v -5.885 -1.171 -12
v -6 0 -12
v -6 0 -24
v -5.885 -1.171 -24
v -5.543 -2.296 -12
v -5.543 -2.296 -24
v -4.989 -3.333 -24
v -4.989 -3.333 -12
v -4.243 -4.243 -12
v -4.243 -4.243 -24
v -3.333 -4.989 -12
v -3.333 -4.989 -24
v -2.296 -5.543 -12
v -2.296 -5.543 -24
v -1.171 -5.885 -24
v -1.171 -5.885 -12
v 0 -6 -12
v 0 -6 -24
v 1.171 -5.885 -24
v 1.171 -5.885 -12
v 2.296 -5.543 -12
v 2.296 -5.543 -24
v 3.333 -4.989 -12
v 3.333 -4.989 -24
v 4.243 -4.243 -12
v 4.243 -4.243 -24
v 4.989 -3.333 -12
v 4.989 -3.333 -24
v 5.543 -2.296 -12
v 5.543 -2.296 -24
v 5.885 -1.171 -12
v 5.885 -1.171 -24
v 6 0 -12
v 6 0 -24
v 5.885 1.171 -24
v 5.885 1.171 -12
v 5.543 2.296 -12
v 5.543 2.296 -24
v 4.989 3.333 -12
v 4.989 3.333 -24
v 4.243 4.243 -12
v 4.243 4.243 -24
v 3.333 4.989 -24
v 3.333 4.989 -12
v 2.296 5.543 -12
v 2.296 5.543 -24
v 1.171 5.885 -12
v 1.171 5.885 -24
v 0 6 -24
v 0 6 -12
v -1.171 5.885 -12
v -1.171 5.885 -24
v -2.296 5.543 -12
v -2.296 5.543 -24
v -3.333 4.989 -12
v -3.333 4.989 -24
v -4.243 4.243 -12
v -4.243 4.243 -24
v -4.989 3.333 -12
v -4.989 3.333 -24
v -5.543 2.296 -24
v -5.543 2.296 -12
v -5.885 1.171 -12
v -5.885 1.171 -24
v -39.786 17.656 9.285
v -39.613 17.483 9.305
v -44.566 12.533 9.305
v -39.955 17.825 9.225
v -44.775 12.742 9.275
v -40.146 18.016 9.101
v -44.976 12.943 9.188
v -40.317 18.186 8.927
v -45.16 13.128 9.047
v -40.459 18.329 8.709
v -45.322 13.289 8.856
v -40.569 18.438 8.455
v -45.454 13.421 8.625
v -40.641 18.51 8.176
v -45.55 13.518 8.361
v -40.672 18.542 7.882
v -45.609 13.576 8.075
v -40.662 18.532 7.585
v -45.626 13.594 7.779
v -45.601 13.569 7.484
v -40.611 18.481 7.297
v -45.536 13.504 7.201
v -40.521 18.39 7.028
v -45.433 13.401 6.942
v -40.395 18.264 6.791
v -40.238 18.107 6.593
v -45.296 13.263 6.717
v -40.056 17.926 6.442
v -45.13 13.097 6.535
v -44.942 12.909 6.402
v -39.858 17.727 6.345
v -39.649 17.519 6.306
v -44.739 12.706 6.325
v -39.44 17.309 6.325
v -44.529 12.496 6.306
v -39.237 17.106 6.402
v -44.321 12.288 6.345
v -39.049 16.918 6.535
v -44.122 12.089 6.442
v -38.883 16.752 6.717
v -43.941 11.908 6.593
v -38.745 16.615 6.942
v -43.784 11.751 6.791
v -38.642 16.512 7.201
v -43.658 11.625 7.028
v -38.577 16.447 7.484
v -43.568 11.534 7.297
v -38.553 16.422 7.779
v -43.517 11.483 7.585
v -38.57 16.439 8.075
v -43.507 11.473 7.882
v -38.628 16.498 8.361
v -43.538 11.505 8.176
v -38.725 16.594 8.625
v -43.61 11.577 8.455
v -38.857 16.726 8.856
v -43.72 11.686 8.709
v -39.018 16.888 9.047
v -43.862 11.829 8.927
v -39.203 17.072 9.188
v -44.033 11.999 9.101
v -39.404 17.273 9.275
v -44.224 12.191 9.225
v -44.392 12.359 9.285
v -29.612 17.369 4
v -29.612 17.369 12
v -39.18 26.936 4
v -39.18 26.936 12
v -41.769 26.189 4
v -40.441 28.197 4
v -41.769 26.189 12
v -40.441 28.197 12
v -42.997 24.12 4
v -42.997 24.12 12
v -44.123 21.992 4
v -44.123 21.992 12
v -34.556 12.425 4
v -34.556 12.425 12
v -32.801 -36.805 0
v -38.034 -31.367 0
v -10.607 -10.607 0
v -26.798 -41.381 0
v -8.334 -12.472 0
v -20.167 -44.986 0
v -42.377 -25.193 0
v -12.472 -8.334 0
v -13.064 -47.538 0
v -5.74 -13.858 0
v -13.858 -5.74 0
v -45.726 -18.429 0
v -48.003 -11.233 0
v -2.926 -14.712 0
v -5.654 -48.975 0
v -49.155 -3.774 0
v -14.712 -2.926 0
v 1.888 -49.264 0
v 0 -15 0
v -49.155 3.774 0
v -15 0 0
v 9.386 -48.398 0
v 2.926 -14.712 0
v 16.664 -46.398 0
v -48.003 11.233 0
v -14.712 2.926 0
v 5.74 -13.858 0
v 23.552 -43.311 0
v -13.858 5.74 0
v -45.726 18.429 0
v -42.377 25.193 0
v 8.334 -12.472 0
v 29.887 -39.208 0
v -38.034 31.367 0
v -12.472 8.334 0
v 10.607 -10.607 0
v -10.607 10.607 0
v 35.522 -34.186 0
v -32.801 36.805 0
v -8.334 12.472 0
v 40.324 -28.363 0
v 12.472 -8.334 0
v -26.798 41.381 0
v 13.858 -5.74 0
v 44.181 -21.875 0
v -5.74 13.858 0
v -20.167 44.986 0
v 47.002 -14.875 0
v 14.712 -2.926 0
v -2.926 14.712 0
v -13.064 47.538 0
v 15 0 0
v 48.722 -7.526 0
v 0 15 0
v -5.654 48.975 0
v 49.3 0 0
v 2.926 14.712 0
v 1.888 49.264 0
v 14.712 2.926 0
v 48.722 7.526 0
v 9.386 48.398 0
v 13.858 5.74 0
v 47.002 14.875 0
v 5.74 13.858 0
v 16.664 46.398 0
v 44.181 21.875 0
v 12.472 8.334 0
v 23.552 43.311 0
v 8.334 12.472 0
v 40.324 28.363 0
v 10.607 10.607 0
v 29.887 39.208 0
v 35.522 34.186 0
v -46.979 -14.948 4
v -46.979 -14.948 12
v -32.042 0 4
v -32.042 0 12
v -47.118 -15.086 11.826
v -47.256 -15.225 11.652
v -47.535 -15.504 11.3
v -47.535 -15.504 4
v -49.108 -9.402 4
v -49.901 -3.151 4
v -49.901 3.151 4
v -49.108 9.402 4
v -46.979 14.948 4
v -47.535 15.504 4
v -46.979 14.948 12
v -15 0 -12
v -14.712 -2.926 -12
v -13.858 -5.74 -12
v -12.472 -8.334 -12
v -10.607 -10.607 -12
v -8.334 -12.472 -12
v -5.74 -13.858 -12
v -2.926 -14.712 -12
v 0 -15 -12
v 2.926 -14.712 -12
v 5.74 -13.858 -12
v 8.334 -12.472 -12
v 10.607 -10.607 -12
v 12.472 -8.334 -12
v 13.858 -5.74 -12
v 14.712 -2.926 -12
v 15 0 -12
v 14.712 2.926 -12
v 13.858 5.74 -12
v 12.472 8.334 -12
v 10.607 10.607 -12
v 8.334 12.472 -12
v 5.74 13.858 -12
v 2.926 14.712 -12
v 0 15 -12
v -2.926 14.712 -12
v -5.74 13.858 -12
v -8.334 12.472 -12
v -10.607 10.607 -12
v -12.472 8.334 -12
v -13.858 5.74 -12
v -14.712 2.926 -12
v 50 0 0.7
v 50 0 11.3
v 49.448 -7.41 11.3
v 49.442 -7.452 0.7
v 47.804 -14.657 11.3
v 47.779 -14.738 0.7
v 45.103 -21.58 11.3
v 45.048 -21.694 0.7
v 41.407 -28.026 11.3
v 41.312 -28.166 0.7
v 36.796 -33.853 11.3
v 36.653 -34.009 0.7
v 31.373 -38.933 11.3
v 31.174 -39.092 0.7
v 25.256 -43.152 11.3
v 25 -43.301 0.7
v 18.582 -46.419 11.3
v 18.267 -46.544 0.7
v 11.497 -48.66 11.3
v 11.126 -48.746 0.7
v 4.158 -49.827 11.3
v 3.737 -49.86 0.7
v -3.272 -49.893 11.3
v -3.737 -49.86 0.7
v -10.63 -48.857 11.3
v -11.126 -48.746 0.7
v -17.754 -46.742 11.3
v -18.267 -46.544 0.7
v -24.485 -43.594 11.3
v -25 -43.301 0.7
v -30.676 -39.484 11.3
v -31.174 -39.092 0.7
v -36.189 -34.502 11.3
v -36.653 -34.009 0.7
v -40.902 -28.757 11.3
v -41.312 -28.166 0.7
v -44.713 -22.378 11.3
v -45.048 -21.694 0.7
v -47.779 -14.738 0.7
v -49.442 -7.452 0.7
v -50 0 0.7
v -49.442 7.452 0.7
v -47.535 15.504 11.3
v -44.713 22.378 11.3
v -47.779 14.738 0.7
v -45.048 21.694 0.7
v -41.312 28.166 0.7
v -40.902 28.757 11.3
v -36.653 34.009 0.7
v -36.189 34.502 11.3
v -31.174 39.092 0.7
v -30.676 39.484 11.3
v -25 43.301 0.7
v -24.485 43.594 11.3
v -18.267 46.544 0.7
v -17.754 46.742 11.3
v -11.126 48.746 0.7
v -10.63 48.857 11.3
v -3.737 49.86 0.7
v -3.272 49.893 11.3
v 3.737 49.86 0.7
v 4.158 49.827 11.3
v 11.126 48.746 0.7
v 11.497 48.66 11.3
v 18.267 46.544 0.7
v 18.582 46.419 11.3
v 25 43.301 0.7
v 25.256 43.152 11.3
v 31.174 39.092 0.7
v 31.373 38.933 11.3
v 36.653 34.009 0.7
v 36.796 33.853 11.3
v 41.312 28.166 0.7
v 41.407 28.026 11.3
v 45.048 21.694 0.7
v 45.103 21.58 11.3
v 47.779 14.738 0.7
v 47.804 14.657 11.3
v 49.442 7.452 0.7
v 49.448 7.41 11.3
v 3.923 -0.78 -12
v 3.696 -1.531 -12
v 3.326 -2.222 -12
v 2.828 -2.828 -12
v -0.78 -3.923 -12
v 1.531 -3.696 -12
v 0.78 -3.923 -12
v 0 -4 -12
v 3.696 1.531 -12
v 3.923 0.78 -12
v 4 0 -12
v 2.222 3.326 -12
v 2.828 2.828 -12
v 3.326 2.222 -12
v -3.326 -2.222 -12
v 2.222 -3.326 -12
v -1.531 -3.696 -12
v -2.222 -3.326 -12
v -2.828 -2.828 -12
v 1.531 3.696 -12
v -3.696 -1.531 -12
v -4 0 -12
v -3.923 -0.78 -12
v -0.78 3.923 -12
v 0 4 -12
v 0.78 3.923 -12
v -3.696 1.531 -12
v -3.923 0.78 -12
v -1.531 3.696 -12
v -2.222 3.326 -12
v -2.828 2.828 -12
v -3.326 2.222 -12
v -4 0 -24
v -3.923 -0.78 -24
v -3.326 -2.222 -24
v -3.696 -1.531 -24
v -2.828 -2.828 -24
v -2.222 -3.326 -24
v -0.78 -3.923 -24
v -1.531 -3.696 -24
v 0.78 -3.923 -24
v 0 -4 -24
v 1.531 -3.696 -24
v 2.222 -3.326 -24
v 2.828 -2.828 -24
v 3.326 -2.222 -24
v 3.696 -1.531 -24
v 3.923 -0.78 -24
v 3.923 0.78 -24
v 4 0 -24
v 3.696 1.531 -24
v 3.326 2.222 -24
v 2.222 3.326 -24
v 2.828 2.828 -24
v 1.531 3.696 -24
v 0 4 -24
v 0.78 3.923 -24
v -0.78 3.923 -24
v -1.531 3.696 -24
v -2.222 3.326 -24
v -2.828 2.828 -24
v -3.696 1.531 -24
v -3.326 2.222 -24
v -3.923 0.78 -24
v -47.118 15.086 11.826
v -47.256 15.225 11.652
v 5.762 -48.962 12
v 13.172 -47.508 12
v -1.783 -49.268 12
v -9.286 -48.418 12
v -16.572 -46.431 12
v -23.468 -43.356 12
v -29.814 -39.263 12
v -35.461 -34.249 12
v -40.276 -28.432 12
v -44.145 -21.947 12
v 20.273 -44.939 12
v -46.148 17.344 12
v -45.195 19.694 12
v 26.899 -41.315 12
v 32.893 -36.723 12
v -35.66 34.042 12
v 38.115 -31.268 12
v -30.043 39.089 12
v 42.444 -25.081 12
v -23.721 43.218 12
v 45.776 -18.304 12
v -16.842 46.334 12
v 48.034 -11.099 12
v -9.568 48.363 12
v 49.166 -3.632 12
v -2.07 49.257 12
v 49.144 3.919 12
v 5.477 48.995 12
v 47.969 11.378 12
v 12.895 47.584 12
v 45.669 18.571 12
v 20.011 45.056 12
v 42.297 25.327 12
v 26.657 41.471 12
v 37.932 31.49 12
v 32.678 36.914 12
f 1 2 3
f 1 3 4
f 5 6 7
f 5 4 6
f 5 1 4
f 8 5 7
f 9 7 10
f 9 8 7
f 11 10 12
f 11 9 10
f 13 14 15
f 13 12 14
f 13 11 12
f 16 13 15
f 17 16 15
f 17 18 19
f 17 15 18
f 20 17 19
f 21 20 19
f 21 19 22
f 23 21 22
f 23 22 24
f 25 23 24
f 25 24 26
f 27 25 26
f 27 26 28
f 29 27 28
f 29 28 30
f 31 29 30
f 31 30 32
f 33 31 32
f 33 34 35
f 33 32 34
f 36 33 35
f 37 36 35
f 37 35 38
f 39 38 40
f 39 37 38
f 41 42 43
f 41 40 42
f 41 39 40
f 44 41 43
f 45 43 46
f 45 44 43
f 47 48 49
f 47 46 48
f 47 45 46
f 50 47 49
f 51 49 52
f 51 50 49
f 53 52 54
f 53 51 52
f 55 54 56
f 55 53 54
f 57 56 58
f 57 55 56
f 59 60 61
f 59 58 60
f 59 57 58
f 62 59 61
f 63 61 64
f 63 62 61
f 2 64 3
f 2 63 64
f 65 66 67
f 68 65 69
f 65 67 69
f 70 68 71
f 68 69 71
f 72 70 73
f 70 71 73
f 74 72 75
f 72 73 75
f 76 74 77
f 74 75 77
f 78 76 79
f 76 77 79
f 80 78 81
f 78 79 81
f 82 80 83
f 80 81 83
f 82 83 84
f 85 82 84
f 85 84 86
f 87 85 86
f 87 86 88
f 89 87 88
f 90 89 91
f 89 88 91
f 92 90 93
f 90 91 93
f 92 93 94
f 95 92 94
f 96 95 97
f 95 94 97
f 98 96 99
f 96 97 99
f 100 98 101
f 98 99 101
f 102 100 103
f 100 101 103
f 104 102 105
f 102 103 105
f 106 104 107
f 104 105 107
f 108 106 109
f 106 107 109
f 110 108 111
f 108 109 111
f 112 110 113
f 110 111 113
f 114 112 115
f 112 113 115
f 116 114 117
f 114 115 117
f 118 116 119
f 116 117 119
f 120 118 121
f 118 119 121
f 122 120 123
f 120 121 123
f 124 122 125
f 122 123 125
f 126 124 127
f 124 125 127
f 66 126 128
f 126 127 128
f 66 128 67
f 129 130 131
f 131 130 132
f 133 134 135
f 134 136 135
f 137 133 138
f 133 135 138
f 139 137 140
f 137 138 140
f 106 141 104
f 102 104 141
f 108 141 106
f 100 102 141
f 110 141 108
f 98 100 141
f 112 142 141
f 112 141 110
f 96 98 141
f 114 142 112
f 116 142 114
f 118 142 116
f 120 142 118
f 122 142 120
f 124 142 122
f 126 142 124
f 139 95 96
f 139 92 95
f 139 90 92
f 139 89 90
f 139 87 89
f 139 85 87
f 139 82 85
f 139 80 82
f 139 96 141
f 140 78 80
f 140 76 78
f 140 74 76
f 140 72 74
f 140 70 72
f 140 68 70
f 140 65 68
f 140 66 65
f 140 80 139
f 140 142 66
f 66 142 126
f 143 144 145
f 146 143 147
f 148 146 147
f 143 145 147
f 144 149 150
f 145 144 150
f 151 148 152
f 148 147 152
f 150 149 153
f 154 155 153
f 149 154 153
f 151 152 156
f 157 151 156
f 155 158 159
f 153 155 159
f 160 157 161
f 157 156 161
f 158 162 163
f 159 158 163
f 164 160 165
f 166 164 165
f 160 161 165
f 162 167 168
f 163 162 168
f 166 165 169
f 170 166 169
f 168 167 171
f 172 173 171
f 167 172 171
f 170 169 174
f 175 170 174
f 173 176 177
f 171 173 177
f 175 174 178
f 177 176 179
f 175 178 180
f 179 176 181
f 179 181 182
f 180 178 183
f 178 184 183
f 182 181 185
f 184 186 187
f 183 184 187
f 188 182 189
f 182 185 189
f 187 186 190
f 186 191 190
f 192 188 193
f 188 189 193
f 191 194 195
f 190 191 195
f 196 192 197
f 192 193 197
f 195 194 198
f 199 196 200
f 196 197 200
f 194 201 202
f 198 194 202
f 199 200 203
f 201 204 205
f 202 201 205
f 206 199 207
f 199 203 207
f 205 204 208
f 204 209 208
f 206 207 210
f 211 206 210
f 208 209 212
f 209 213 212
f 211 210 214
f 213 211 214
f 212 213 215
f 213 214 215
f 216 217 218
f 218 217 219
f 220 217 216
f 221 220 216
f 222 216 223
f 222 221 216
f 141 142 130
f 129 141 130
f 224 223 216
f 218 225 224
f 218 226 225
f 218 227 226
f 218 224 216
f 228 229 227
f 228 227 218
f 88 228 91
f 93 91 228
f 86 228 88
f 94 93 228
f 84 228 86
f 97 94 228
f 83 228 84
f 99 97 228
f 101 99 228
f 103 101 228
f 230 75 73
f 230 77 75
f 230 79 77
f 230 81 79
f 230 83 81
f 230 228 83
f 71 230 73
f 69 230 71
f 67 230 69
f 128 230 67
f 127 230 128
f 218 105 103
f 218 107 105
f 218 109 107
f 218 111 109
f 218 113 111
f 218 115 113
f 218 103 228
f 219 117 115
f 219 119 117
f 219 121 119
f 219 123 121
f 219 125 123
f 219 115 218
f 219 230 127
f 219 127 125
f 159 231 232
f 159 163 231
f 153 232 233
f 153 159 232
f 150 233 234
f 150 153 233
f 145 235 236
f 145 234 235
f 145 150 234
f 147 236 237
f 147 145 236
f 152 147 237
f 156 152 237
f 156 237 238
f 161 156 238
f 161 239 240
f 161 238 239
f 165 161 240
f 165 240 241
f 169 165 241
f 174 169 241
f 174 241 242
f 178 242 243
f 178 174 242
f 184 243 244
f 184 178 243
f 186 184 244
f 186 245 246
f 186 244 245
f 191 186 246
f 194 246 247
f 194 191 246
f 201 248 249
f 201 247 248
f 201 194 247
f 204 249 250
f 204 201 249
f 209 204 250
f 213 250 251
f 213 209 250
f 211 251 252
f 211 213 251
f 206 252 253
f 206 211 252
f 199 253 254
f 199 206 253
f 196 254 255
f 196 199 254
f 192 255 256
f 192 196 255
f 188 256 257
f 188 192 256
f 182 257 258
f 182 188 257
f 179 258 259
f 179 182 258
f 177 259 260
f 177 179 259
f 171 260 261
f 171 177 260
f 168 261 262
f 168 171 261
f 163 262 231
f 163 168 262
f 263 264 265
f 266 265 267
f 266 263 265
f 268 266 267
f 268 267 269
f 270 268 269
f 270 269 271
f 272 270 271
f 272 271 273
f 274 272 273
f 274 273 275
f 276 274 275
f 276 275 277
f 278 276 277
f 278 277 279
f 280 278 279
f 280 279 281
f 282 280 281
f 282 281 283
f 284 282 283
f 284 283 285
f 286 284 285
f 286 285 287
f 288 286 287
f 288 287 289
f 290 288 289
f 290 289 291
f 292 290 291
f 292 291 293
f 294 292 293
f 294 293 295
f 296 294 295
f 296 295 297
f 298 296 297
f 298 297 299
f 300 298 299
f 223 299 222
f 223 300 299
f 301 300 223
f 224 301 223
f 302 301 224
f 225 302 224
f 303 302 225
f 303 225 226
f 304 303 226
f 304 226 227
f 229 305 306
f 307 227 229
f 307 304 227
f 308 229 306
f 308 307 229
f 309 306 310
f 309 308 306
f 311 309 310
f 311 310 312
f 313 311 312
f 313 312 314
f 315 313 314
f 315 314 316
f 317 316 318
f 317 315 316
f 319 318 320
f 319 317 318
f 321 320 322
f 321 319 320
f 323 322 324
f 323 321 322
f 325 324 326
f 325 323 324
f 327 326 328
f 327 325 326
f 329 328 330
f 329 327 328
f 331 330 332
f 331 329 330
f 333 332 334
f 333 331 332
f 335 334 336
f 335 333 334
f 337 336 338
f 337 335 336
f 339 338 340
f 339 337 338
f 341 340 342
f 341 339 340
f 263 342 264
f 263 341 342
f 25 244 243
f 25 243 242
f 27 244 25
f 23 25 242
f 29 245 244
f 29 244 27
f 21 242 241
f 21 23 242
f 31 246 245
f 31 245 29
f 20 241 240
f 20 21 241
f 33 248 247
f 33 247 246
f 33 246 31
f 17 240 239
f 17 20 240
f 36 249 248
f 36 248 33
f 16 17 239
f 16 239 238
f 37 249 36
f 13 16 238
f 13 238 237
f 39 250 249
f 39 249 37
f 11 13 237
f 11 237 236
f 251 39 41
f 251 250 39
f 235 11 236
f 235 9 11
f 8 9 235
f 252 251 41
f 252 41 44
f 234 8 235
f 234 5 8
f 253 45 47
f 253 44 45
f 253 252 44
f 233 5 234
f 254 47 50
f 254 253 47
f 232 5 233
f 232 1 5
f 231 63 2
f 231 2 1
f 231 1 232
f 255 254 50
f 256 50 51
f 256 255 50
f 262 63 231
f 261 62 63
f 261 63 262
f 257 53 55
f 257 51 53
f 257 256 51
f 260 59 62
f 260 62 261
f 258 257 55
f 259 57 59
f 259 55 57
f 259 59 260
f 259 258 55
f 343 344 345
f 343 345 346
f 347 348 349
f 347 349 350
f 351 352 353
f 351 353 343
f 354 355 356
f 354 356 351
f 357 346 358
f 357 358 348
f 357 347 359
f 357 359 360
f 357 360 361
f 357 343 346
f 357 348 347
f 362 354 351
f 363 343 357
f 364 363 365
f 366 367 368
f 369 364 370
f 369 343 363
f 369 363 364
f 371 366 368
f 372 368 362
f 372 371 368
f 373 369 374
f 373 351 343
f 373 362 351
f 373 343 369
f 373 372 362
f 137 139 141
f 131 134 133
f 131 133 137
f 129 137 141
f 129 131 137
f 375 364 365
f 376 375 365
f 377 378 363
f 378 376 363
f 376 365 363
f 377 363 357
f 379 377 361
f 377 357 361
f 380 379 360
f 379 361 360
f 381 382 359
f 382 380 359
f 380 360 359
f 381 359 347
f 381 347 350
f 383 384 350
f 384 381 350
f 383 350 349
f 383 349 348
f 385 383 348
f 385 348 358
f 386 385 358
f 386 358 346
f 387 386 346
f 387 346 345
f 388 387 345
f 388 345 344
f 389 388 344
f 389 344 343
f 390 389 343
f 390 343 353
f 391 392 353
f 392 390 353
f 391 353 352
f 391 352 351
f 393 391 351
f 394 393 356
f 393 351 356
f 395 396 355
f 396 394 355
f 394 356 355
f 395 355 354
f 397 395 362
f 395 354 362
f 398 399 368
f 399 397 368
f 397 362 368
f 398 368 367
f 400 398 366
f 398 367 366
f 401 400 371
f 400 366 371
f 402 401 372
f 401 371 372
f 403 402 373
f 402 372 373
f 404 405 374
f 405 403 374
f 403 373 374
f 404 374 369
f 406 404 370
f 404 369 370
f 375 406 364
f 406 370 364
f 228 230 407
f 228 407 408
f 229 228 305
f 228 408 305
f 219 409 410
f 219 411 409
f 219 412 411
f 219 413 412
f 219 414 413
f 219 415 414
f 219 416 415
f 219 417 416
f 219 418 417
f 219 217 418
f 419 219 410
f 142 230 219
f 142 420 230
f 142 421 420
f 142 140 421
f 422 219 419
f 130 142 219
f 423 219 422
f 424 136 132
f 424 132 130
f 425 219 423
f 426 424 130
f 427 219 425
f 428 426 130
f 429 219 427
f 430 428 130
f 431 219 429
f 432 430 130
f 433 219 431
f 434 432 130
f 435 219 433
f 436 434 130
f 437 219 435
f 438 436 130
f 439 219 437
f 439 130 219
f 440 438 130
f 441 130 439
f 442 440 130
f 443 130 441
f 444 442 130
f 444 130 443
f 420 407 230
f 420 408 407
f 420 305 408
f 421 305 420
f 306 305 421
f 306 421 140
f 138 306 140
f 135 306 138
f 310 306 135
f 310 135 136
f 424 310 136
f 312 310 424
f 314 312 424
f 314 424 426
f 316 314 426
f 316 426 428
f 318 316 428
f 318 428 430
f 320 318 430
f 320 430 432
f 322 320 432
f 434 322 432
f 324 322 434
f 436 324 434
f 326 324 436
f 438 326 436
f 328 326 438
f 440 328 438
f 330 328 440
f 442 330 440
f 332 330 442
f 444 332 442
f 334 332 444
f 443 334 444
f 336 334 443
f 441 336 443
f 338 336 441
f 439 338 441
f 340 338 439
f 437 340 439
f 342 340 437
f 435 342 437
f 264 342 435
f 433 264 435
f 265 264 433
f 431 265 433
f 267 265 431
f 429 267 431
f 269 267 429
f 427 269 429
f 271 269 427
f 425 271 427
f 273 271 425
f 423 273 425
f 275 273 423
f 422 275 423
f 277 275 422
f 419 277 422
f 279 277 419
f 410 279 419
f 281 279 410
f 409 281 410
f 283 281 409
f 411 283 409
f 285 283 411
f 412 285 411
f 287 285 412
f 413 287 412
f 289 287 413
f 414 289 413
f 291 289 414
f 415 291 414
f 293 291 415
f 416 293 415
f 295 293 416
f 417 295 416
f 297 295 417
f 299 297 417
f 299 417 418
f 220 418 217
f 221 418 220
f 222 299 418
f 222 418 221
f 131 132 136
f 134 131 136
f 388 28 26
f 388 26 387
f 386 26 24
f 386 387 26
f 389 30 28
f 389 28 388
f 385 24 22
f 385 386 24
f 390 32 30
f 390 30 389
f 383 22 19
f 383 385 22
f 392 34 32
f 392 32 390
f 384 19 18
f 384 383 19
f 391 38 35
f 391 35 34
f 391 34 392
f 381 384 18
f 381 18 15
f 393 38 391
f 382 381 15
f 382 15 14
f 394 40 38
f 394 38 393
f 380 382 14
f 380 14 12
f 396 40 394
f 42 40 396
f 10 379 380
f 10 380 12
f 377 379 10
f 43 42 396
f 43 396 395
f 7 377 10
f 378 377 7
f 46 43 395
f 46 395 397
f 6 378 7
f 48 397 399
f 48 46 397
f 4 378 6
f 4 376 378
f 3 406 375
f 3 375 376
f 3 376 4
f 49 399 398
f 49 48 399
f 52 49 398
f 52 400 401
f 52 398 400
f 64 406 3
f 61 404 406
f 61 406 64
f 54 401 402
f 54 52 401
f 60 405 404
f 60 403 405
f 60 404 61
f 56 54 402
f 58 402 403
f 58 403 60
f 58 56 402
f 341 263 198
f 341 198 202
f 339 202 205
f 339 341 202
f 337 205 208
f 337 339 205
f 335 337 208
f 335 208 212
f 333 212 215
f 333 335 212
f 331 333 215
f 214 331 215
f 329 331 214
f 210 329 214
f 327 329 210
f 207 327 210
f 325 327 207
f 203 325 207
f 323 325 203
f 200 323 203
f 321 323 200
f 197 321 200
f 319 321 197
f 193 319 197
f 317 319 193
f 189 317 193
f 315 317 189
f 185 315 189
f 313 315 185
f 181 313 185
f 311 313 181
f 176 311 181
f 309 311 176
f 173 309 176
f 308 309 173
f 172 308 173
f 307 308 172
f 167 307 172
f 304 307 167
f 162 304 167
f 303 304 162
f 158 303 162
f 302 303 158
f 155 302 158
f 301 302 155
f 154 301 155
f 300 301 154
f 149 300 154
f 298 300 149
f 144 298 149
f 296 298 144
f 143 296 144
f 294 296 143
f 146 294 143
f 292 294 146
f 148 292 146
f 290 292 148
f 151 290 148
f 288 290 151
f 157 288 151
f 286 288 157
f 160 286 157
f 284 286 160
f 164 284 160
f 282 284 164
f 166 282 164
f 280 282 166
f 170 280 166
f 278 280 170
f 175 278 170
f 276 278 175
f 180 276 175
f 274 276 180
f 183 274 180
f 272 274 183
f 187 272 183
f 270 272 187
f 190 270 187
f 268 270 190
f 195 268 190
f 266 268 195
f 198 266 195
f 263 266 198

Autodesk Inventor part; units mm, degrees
ref_plane "YZ Plane" through (0, 0, 0) normal (1, 0, 0) x (0, 1, 0)
ref_plane "XZ Plane" through (0, 0, 0) normal (0, 1, 0) x (-1, 0, 0)
ref_plane "XY Plane" through (0, 0, 0) normal (0, 0, 1) x (1, 0, 0)
sketch "Sketch1" plane through (0, 0, 0) normal (0, 0, 1) x (1, 0, 0)
  circle A0 centre (0, 0) radius 50
  dimension "d0" = 100
extrude "Extrusion1" add sketch "Sketch1" along normal blind 12
sketch "Sketch2" plane through (0, 0, 0) normal (0, 0, -1) x (-1, 0, 0)
  circle A0 centre (0, 0) radius 15
  dimension "d3" = 30
extrude "Extrusion2" add sketch "Sketch2" along normal blind 12
chamfer "Chamfer1" distance 0.7 angle 45 1 edges at (-50, 0, 0)
chamfer "Chamfer2" distance 0.7 angle 45 1 edges at (-50, 0, 12)
sketch "Sketch9" plane through (0, 0, -12) normal (0, 0, -1) x (-1, 0, 0)
  circle A0 centre (0, 0) radius 6
  circle A1 centre (0, 0) radius 4
  dimension "d32" = 12
  dimension "d33" = 8
extrude "Extrusion9" add sketch "Sketch9" along normal blind 12
sketch "Sketch10" plane through (0, 0, 12) normal (0, 0, 1) x (1, 0, 0)
  circle A0 centre (0, 0) radius 49.3 projected
  line L0 (-46.9792, -14.9479) -> (-32.0415, 0)
  line L1 (-32.0415, 0) -> (-34.8474, 0)
  line L2 (-46.9792, 14.9479) -> (-32.0415, 0)
  line L3 (-46.9792, -14.9479) -> (-50.9309, -18.8996)
  line L4 (-46.9792, -14.9479) -> (-41.3907, -14.9479) construction
  line L5 (-46.9792, 14.9479) -> (-50.9309, 18.8996)
  arc A1 (-50.9309, 18.8996) -> (-50.9309, -18.8996) centre (-5.1445, 0) ccw
  arc A2 (-46.9792, 14.9479) -> (-46.9792, -14.9479) centre (0, 0) ccw
  line L6 (-17.4257, 0) -> (-43.6281, 26.2024)
  line L7 (-17.4257, 0) -> (19.6301, 0) construction
  line L8 (-12.476, 4.9497) -> (-38.6784, 31.1522)
  line L9 (-17.4257, 0) -> (-12.476, 4.9497)
  arc A3 (-38.4198, 30.8935) -> (-42.4668, 25.0411) centre (0, 0) ccw
  arc A4 (-38.6784, 31.1522) -> (-43.6281, 26.2024) centre (-36.0468, 23.5708) ccw
  dimension "d36" = 135
  dimension "d39" = 135
extrude "Extrusion10" cut sketch "Sketch10" against normal blind 8 contours L3 A1 L5 A0 | A0 L2 L0
sketch "Sketch11" plane through (0, 0, 12) normal (0, 0, 1) x (1, 0, 0)
  line L0 (-46.9792, 14.9479) -> (-32.0415, 0) projected
  line L1 (-39.5104, 7.474) -> (-34.5589, 12.422)
  line L2 (-22.1379, 0.0075) -> (-44.1228, 21.9924)
  circle A0 centre (0, 0) radius 49.3 projected
  line L3 (-34.5589, 12.422) -> (-29.6092, 17.3718)
  line L4 (-34.5589, 12.422) -> (-27.5589, 12.422) construction
  line L5 (-32.0841, 14.8969) -> (-29.6092, 12.422)
  line L6 (-17.1946, 4.9507) -> (-39.1796, 26.9357)
  line L7 (-22.1379, 0.0075) -> (-17.1946, 4.9507)
  line L8 (-39.1796, 26.9357) -> (-40.4406, 28.1966)
  line L9 (-44.1228, 21.9924) -> (-46.2441, 24.1138)
  line L10 (-40.4406, 28.1966) -> (-42.3953, 30.4724)
  arc A1 (-42.3953, 30.4724) -> (-46.289, 24.1586) centre (-36.8863, 22.7176) ccw
  arc A2 (-46.9792, -14.9479) -> (-46.9792, 14.9479) centre (0, 0) ccw projected
  point P0 (-34.5557, 12.4253)
  point P1 (-29.6124, 17.3685)
  dimension "d42" = 7
  dimension "d43" = 7
  dimension "d45" = 3
  dimension "d46" = 3
extrude "Extrusion11" cut sketch "Sketch11" against normal blind 8 contours A0 L8 L6 L3 L2
sketch "Sketch12" plane through (-46.9792, 14.9479, 4) normal (-0.7073, -0.7069, 0) x (0, 0, 1)
  circle A0 centre (3.8047, -3.4144) radius 1.5
  point P0 (-4, -43.7814)
  dimension "d49" = 3
extrude "Extrusion12" cut sketch "Sketch12" against normal blind 8
properties part number "FlyCutter"
